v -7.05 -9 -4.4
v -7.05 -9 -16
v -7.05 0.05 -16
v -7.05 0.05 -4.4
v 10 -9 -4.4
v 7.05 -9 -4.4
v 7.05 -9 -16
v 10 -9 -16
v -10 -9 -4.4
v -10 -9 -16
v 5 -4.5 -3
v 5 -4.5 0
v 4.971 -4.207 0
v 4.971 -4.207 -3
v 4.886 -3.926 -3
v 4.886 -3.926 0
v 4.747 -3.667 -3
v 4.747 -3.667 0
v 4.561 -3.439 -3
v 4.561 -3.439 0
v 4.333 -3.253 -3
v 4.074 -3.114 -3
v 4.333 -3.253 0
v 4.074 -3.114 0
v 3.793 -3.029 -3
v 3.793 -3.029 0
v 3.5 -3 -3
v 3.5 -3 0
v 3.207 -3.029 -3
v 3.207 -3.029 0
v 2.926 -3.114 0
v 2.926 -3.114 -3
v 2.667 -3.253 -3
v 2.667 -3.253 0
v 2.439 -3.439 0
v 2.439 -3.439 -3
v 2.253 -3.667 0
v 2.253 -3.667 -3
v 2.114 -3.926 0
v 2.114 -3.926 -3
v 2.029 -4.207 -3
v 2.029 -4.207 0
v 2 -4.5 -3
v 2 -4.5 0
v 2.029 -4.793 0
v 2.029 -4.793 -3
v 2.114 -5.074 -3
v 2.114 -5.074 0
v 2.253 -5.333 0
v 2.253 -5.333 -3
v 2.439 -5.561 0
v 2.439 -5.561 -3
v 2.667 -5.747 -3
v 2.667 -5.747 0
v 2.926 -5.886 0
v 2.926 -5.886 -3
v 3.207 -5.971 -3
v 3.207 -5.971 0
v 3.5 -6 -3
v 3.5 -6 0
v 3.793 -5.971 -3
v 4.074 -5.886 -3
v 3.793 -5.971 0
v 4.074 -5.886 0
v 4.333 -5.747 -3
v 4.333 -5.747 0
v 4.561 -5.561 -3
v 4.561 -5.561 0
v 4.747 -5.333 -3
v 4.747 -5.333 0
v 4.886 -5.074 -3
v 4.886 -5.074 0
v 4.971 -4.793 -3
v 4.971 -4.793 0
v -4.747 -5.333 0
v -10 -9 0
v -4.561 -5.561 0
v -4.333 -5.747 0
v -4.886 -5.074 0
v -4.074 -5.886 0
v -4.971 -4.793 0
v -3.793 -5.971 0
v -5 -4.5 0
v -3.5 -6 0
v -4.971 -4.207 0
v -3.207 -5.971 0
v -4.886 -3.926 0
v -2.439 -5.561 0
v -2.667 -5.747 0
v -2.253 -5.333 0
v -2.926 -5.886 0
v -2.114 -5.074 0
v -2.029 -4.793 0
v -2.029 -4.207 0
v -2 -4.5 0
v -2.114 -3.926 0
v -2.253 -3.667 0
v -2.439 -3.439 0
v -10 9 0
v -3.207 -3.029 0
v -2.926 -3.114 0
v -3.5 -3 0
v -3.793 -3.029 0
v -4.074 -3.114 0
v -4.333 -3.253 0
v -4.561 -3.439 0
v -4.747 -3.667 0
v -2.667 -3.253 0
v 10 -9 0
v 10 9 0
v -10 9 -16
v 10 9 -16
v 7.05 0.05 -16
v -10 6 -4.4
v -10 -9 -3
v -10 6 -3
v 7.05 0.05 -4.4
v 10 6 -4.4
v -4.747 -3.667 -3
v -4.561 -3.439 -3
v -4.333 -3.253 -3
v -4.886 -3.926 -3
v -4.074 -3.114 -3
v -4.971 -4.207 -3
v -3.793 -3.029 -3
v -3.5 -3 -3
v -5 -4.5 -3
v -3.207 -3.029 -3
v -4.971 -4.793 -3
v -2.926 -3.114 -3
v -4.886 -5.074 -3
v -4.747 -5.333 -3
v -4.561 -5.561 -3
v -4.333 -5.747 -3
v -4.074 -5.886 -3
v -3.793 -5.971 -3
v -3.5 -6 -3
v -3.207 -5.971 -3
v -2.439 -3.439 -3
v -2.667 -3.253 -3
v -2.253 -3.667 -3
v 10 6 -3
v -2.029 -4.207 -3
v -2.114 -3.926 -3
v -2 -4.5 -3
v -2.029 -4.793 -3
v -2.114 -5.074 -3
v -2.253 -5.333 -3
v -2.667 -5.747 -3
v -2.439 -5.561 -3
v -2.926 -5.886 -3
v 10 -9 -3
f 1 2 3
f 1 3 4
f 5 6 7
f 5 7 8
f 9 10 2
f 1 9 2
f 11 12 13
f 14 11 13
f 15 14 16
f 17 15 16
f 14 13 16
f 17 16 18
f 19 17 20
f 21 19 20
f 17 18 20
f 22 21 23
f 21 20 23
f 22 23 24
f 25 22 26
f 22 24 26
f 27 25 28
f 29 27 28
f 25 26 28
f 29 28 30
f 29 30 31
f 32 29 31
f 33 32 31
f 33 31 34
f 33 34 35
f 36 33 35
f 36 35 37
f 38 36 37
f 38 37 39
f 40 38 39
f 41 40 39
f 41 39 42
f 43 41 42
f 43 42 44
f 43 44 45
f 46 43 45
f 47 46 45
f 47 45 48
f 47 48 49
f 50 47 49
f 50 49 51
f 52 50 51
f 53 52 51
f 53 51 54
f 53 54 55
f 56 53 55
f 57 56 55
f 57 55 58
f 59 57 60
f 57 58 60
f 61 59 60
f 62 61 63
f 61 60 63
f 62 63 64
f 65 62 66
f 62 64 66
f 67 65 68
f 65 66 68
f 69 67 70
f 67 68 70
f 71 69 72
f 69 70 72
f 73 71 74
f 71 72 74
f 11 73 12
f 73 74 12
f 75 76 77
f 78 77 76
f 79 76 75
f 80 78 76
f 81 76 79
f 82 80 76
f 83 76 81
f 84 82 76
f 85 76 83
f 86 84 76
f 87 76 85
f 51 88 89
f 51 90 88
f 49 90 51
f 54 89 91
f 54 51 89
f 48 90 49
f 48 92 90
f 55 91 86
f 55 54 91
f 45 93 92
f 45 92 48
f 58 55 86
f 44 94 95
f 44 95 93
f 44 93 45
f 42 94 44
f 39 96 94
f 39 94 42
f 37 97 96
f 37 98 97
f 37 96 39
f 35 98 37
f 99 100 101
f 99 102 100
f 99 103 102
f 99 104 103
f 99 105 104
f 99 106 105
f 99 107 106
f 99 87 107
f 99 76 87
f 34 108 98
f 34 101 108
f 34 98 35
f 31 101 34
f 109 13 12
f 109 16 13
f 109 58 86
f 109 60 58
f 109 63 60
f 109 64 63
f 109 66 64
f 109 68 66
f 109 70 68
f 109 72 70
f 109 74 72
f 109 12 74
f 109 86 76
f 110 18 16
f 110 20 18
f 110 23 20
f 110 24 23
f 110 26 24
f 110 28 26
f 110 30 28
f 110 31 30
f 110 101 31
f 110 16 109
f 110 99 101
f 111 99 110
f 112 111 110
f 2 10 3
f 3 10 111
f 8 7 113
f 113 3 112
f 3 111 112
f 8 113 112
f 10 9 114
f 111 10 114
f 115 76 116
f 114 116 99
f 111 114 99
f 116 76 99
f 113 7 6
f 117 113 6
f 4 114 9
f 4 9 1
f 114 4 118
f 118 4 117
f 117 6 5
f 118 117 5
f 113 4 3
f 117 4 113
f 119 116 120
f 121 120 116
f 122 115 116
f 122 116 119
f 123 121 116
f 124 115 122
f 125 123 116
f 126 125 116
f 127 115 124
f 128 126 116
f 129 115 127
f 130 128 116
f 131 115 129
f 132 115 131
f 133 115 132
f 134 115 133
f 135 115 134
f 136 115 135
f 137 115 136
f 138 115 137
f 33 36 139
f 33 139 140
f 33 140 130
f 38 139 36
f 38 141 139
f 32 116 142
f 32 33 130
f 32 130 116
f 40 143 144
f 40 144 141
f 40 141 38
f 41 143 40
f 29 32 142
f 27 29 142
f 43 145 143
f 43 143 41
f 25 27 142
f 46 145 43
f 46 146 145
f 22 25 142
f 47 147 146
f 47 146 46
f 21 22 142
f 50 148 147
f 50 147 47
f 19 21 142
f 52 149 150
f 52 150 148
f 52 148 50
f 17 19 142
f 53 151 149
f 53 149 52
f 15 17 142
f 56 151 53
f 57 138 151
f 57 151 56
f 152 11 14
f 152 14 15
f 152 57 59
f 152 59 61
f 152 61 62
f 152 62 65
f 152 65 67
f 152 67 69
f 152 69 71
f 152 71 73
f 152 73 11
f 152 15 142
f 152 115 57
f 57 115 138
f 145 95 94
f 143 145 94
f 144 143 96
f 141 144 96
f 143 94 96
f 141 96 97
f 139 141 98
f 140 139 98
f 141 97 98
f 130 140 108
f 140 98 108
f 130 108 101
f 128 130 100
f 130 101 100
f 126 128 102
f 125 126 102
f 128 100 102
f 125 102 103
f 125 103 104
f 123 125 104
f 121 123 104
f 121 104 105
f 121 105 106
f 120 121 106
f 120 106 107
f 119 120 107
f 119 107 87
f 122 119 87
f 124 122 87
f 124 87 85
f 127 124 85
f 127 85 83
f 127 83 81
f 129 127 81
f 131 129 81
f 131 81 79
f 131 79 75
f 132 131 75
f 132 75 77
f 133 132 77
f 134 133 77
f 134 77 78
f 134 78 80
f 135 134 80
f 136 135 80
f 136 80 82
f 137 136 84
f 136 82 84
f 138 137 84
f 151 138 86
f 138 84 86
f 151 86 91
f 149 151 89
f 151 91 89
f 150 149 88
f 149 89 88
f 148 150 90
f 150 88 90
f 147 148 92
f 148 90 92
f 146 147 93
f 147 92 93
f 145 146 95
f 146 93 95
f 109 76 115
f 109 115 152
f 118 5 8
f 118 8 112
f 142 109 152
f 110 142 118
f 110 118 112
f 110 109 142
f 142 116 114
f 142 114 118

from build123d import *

# Parameters (mm, degrees)
CROQUIS1_W              = 20
CROQUIS1_H              = 18
SALIENTE_EXTRUIR1_DEPTH = 16
CROQUIS2_W              = 14.1
CROQUIS2_H              = 11.6
CORTAR_EXTRUIR1_DEPTH   = 9.05
CROQUIS4_W              = 20
CROQUIS4_H              = 1.4
CORTAR_EXTRUIR2_DEPTH   = 15
CROQUIS5_R              = 1.5
CORTAR_EXTRUIR3_DEPTH   = 17


with BuildPart() as part:
    # Croquis1 → Saliente-Extruir1 (new body)
    with BuildSketch(Plane.XY):
        Rectangle(CROQUIS1_W, CROQUIS1_H)
    extrude(amount=-SALIENTE_EXTRUIR1_DEPTH)

    # Croquis2 → Cortar-Extruir1 (cut)
    with BuildSketch(Plane.XZ.offset(9)):
        with Locations((0, -10.2)):
            Rectangle(CROQUIS2_W, CROQUIS2_H)
    extrude(amount=-CORTAR_EXTRUIR1_DEPTH, mode=Mode.SUBTRACT)

    # Croquis4 → Cortar-Extruir2 (cut)
    with BuildSketch(Plane.XZ.offset(9)):
        with Locations((0, -3.7)):
            Rectangle(CROQUIS4_W, CROQUIS4_H)
    extrude(amount=-CORTAR_EXTRUIR2_DEPTH, mode=Mode.SUBTRACT)

    # Croquis5 → Cortar-Extruir3 (cut, through all)
    with BuildSketch(Plane.XY):
        with Locations((-3.5, -4.5)):
            Circle(CROQUIS5_R)
        with Locations((3.5, -4.5)):
            Circle(CROQUIS5_R)
    extrude(amount=-CORTAR_EXTRUIR3_DEPTH, mode=Mode.SUBTRACT)


solid = part.part
